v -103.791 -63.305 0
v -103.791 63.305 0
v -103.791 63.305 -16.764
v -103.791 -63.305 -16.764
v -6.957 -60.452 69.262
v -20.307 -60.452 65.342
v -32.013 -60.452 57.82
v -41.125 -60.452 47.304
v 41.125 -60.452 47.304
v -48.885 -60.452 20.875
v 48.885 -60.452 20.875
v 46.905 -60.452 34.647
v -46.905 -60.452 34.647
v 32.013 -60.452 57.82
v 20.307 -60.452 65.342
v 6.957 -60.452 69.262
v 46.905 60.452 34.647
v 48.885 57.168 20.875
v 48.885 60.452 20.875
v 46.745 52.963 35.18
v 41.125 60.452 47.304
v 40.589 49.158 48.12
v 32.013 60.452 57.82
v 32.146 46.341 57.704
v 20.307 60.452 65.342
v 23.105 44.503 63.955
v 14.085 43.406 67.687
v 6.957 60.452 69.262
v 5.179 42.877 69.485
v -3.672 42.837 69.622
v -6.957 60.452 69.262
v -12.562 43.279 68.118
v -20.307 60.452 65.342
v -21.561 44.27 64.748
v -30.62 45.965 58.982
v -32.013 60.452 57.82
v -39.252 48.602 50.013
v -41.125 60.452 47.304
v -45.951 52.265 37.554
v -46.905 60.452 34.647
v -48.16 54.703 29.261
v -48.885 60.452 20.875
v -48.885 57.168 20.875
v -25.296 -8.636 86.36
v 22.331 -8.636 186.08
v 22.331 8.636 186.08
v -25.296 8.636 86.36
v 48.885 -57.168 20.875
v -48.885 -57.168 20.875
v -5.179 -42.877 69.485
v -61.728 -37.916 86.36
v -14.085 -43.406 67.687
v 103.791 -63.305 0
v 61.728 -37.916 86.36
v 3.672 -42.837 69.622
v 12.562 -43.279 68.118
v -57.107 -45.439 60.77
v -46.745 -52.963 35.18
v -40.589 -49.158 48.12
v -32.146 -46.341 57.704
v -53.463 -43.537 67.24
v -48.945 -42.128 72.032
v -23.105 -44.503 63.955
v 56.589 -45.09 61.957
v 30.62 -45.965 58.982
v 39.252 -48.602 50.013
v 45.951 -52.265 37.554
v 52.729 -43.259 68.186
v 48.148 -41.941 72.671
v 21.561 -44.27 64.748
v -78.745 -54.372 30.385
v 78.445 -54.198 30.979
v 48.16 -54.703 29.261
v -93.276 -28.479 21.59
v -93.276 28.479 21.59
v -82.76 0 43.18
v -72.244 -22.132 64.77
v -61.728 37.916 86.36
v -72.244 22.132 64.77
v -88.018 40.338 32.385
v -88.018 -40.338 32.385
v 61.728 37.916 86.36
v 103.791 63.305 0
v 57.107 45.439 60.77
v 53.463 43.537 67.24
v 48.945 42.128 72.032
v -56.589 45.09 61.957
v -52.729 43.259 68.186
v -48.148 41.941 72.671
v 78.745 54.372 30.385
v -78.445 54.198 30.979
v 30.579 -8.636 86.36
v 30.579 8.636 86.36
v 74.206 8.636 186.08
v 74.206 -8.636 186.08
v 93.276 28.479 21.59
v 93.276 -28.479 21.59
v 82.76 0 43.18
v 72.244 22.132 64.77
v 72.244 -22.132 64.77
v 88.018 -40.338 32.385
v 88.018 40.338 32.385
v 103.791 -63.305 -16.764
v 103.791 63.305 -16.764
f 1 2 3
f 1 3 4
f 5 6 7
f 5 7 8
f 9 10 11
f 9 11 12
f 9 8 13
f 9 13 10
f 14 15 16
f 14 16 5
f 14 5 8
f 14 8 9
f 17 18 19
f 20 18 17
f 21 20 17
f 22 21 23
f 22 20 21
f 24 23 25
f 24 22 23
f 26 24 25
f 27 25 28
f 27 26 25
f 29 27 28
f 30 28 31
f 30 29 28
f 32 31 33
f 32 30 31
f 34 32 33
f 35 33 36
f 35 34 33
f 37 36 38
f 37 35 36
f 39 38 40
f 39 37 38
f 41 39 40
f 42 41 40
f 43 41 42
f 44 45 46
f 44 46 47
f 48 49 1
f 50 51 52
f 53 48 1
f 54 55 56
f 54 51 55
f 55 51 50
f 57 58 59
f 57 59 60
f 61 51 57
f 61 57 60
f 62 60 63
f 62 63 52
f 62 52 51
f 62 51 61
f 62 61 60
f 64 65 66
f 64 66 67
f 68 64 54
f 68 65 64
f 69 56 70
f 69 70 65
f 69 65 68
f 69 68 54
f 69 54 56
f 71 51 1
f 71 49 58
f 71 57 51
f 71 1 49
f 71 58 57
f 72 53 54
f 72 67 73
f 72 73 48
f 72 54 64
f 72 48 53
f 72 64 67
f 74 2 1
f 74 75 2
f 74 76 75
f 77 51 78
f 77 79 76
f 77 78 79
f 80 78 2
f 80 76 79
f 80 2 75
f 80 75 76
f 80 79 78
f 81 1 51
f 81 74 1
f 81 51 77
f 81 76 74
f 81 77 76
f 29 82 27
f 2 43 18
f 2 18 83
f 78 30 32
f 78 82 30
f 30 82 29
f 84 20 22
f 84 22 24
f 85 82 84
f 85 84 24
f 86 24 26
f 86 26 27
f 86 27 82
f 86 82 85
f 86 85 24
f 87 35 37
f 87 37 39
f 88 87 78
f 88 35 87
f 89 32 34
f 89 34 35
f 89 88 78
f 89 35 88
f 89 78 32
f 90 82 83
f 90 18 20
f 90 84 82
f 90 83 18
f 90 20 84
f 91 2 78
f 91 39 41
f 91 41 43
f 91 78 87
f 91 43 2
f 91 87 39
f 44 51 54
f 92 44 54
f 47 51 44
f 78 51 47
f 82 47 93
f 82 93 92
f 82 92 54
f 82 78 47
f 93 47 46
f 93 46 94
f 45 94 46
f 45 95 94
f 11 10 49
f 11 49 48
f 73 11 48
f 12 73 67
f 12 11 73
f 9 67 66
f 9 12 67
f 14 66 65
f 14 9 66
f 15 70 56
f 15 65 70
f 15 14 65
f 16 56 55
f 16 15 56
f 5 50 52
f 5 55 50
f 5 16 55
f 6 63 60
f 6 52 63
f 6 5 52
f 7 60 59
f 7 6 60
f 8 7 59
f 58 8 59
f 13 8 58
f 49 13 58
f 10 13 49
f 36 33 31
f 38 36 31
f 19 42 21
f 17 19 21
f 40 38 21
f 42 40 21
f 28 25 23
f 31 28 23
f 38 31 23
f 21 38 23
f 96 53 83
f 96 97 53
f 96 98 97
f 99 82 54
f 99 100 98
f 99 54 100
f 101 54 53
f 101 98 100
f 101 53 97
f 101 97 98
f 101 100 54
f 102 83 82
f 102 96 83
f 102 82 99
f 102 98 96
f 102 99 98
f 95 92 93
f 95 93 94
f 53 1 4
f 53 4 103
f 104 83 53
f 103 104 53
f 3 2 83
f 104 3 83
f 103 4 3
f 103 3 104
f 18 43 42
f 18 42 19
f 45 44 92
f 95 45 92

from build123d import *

# Parameters (mm, degrees)
F1_W     = 207.582682
F1_H     = 126.610666
F2_W     = 123.456738
F2_H     = 75.831934
F5_DEPTH = 60.452
F6_W     = 207.582682
F6_H     = 126.610666
F7_DEPTH = 16.764
F8_DEPTH = 8.636


with BuildPart() as f3:
    # F1 (on Top) → F3 section 0
    with BuildSketch(Plane.XY):
        Rectangle(F1_W, F1_H)
    # F2 (on offset) → F3 section 1
    with BuildSketch(Plane.XY.offset(86.36)):
        Rectangle(F2_W, F2_H)
    loft()

    # F4 (on Front) → F5 (join, symmetric)
    with BuildSketch(Plane.XZ):
        with BuildLine():
            Line((-48.884847, 20.875009), (48.884847, 20.875009))
            ThreePointArc((48.884847, 20.875009), (0, 69.759856), (-48.884847, 20.875009))
        make_face()
    extrude(amount=F5_DEPTH, both=True)

    # F6 (on face) → F7 (join)
    with BuildSketch(Plane(origin=(0, 0, 0), x_dir=(1, 0, 0), z_dir=(0, 0, -1))):
        Rectangle(F6_W, F6_H)
    extrude(amount=F7_DEPTH)

    # F4 (on Front) → F8 (join, symmetric)
    with BuildSketch(Plane.XZ):
        Polygon((22.331208, 186.080039), (-26.018247, 84.848367), (-29.040085, 81.322886), (28.374884, 81.322886), (74.206144, 186.080039), align=None)
    extrude(amount=F8_DEPTH, both=True)


solid = f3.part
